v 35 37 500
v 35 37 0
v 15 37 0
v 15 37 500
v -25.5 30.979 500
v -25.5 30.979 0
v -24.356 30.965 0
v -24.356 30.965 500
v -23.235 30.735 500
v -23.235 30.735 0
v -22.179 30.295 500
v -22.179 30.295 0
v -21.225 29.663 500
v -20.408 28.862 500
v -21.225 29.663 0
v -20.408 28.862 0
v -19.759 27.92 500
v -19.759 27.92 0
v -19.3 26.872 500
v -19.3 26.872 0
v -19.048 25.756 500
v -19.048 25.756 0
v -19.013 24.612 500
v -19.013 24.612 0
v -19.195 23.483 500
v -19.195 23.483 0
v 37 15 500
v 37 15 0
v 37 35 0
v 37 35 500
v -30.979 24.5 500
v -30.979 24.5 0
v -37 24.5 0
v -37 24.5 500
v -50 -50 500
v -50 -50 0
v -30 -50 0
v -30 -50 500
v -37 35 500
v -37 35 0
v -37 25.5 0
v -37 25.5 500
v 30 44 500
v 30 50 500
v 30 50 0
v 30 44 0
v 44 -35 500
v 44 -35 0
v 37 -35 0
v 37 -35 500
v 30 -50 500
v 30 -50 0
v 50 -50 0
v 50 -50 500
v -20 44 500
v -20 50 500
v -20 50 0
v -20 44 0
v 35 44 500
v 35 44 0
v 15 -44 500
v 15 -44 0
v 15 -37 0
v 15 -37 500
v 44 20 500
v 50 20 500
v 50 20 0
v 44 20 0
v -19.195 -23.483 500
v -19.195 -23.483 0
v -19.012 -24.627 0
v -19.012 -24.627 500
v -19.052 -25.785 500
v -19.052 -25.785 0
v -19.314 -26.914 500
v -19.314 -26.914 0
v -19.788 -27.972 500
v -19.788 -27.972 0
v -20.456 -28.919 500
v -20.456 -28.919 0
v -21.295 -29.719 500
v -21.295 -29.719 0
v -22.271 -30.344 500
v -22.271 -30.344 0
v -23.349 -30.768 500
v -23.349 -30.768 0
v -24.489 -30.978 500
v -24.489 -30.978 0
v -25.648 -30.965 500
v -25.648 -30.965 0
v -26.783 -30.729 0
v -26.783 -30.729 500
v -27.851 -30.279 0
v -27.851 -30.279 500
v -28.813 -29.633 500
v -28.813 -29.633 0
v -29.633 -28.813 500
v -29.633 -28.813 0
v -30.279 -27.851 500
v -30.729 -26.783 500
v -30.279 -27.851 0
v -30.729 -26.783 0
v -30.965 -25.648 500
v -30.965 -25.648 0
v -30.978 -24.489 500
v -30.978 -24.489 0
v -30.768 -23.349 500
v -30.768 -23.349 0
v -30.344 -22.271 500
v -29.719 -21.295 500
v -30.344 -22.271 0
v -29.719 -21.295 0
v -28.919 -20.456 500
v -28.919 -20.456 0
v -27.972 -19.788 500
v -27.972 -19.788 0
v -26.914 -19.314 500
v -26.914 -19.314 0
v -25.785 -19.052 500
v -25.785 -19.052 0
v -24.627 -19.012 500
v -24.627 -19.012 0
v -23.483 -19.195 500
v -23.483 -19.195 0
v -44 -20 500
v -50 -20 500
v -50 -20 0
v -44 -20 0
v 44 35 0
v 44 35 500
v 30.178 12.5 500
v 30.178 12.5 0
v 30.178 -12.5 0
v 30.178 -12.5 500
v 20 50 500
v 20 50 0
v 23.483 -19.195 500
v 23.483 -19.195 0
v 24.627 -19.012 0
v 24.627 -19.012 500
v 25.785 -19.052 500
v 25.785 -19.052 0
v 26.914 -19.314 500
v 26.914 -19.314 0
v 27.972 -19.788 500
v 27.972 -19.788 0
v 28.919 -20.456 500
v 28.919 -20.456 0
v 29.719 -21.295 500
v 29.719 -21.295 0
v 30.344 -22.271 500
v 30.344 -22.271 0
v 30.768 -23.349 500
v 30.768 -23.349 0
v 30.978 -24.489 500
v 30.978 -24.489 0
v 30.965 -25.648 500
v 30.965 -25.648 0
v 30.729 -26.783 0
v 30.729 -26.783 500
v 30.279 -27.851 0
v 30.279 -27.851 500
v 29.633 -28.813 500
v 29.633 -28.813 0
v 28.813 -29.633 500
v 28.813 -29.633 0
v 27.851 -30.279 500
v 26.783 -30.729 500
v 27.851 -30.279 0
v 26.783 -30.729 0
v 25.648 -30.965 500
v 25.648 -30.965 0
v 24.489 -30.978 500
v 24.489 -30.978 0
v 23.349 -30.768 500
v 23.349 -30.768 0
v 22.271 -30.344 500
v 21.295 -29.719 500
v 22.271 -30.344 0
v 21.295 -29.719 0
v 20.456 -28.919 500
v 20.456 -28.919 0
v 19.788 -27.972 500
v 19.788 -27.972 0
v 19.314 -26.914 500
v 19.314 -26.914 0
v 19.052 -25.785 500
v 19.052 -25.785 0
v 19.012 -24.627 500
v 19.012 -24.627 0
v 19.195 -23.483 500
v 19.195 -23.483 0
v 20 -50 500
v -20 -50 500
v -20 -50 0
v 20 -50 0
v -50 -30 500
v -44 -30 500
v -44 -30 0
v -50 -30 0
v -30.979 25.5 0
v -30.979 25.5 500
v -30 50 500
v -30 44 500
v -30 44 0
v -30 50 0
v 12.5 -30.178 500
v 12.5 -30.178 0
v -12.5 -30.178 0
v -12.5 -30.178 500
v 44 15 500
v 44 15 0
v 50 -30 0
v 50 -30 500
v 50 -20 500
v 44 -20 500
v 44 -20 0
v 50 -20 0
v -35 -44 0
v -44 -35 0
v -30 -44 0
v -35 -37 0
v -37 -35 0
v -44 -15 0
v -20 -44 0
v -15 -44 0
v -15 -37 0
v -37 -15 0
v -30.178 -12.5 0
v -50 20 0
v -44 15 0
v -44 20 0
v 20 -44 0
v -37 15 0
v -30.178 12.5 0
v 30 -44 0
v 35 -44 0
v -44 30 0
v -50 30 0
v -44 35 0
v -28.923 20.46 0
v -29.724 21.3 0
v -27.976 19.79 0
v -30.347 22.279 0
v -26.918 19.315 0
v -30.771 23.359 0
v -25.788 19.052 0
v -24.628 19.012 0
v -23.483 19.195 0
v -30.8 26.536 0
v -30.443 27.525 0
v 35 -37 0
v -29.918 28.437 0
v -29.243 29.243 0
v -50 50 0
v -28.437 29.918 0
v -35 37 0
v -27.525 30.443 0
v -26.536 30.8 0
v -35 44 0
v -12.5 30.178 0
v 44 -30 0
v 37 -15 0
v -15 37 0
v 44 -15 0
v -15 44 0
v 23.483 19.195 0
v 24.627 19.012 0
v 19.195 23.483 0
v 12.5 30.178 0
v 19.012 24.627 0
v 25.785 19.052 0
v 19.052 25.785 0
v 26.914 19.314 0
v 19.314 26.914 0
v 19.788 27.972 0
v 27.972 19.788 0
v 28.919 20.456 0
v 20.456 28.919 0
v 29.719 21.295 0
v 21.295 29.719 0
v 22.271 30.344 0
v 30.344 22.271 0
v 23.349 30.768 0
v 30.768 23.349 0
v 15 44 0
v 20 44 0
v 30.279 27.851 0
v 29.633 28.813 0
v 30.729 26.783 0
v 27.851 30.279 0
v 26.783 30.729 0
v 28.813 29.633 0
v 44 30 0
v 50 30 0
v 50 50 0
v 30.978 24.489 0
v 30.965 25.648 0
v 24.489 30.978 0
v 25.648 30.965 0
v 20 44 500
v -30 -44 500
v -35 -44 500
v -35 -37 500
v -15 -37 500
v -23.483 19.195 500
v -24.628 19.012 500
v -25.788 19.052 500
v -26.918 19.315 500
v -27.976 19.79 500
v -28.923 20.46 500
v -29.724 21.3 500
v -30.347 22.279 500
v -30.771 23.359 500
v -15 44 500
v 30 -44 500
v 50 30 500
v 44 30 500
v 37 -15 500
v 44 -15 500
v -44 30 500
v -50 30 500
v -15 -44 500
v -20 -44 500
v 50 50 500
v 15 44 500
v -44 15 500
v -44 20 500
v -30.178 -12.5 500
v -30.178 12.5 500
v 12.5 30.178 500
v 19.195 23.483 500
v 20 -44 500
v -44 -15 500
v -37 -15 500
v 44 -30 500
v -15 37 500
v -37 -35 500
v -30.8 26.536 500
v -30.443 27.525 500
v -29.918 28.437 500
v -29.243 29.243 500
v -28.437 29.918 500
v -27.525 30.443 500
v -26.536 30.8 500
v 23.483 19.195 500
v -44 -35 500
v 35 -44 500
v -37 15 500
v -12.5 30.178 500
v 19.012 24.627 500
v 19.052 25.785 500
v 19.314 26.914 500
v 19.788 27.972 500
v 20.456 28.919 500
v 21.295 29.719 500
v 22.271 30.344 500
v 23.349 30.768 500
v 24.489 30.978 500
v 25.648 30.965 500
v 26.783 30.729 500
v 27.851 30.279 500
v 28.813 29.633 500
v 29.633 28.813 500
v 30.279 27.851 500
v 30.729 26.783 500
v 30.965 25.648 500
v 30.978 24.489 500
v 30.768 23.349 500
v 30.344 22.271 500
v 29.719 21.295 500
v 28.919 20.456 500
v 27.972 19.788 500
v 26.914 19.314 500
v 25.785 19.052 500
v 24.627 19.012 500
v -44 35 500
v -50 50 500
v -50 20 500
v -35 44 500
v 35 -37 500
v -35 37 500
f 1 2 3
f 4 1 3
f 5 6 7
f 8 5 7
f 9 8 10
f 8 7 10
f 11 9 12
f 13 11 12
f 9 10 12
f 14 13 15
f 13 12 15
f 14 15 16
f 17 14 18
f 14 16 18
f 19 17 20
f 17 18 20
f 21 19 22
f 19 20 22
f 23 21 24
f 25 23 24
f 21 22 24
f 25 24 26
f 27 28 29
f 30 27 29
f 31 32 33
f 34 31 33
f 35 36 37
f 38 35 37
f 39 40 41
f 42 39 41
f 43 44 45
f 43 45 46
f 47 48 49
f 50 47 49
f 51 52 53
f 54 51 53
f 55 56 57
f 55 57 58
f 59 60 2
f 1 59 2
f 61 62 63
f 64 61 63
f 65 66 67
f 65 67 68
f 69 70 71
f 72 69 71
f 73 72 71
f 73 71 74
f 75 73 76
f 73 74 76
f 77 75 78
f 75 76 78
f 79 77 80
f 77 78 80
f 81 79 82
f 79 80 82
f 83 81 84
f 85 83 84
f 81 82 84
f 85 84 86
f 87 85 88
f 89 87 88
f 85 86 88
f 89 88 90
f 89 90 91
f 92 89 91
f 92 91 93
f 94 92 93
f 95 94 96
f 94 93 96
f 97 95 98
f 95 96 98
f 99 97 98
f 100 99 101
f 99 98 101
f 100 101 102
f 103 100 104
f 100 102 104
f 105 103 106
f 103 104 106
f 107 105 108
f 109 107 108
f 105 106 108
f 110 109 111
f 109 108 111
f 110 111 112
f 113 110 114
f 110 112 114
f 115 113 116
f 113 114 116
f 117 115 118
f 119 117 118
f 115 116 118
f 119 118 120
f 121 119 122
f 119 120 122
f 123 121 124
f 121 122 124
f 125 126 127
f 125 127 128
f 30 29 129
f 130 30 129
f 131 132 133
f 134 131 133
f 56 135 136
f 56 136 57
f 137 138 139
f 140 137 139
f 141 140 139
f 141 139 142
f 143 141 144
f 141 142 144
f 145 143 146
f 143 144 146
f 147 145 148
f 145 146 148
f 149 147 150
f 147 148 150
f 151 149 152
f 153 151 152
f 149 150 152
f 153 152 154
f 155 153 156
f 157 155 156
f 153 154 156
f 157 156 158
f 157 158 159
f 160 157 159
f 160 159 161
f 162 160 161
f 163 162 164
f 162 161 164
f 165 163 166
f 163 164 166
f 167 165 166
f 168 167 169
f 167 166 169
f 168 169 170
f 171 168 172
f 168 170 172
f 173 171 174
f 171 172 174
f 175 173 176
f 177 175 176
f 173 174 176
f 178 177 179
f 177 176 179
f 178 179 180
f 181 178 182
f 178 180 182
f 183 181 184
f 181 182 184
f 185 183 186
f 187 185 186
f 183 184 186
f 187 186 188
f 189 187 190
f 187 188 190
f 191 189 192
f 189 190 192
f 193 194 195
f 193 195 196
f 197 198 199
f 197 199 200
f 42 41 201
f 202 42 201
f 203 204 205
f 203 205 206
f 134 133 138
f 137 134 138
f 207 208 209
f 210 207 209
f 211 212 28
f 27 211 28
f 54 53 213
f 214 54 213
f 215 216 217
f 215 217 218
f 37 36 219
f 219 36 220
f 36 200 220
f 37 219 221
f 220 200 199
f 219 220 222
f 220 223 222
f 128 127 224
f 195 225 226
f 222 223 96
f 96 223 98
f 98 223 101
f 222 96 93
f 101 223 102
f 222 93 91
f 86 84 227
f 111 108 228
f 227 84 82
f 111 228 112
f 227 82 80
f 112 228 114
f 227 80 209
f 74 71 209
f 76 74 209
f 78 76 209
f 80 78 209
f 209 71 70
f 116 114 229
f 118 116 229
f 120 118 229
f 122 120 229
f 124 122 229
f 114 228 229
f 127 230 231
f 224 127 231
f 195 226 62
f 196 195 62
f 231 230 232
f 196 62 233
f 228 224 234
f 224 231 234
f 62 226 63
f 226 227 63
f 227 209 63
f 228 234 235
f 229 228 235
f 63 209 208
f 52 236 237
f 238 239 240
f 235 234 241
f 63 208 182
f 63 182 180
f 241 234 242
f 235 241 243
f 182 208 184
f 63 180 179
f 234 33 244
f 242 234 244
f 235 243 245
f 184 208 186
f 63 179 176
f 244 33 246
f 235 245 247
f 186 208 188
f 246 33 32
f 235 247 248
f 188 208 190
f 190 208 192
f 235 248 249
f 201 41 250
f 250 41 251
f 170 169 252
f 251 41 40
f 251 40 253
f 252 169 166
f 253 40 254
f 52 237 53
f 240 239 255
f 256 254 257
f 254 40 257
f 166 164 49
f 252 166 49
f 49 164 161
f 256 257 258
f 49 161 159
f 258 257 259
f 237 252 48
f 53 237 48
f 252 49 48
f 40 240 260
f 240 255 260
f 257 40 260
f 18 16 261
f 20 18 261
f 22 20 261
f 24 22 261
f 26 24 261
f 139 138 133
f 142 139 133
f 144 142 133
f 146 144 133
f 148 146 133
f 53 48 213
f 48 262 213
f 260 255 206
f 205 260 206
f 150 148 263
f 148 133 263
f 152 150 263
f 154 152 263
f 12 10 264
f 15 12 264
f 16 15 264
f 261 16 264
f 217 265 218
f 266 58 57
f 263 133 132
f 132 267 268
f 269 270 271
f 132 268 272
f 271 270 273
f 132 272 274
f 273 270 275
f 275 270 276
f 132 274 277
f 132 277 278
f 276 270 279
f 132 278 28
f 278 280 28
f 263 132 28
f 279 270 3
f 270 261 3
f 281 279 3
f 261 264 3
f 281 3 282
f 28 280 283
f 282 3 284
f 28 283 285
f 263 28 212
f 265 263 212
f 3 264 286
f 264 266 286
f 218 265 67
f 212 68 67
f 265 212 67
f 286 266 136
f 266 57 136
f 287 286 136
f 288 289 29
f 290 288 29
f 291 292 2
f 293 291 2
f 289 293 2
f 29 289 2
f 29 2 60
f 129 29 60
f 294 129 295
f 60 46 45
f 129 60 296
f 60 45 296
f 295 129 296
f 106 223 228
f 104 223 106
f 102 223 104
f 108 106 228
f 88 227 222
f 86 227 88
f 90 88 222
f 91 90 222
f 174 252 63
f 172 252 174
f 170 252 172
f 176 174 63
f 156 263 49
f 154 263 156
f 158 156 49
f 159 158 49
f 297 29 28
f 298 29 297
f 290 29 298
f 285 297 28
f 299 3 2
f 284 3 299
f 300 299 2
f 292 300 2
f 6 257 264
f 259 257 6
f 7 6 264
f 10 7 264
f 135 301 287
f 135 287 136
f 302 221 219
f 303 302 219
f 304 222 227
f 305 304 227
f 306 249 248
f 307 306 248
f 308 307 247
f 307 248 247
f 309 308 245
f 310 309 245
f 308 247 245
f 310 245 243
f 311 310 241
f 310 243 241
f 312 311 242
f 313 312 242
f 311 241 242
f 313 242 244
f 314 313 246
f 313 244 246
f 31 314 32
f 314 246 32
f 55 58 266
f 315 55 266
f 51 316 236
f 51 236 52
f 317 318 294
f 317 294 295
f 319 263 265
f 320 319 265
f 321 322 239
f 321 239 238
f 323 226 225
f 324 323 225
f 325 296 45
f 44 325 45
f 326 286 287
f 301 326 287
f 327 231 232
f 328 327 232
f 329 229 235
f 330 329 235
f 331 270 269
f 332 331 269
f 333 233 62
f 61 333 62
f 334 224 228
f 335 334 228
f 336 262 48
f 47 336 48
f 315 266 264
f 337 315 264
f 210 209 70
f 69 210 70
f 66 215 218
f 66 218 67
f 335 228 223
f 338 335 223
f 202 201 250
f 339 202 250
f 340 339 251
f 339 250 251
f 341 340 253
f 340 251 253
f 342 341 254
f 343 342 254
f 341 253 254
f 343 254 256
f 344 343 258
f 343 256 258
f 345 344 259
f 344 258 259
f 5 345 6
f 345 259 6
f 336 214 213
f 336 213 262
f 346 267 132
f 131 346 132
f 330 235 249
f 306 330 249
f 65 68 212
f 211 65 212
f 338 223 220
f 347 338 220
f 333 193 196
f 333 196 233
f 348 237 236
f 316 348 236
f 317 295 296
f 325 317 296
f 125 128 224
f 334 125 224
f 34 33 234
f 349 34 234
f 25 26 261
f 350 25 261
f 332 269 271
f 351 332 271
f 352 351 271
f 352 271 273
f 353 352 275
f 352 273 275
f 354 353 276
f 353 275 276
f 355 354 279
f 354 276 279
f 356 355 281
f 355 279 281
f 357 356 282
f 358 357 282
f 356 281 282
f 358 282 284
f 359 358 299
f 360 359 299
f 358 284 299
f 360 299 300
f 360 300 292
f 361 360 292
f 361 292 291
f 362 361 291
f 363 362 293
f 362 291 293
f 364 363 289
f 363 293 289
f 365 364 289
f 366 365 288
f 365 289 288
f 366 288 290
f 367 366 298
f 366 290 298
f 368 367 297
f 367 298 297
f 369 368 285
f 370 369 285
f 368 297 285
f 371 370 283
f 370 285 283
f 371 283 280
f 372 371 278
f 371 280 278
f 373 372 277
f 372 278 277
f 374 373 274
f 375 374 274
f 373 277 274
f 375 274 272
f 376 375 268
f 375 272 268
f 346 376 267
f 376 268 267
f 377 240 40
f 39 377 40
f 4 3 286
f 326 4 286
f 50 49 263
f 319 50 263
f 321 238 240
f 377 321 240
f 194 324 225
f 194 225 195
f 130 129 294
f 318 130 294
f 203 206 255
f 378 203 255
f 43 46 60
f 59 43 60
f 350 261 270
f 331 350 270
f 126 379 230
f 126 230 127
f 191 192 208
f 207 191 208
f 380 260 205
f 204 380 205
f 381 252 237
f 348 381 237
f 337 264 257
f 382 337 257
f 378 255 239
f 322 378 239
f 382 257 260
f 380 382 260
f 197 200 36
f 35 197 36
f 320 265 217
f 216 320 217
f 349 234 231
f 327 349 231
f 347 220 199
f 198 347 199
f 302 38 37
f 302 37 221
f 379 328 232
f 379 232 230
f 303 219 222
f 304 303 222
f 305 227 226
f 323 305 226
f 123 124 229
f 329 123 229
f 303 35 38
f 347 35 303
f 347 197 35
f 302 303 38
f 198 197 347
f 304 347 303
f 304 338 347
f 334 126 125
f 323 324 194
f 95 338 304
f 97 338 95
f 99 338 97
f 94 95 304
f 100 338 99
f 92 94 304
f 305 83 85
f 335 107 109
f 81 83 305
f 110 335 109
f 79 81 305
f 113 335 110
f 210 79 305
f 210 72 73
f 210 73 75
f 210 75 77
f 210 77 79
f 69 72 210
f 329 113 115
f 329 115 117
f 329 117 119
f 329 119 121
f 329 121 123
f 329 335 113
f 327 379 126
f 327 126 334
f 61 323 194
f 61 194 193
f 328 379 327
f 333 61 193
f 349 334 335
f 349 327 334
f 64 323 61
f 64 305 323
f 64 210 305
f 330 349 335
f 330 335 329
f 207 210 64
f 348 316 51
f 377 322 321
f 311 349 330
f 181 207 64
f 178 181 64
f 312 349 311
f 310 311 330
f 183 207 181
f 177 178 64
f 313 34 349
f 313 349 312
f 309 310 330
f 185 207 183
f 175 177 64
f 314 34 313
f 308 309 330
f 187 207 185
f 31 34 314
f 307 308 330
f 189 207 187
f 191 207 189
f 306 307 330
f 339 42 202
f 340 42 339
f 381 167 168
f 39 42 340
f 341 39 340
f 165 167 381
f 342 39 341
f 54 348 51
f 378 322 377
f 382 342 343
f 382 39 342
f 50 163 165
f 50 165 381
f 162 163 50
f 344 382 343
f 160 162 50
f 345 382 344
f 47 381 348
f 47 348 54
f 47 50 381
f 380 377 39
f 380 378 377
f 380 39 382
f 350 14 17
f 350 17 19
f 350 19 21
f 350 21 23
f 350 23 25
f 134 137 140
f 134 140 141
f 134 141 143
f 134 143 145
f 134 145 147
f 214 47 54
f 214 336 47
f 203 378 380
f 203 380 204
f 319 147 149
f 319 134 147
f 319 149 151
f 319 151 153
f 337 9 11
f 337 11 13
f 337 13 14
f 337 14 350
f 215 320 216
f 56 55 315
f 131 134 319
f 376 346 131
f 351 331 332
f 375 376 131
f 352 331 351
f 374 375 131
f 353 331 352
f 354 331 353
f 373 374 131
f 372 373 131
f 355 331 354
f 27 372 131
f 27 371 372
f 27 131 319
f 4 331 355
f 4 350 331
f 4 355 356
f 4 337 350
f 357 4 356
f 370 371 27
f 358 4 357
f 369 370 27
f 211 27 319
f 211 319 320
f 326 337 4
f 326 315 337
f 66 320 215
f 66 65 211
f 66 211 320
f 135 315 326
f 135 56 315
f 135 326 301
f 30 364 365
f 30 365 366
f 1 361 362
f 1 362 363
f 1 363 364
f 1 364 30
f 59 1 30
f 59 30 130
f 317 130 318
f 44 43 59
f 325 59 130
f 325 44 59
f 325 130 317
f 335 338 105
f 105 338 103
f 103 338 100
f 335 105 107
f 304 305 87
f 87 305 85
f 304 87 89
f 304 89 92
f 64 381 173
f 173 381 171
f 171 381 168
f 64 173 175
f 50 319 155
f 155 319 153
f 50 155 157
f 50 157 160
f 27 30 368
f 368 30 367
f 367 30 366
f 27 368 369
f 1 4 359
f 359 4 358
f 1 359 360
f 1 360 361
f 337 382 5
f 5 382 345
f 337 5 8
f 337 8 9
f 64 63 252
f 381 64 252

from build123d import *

# Parameters (mm, degrees)
F1_DEPTH = 500


with BuildPart() as f1:
    # F0 (on Top) → F1 (new body)
    with BuildSketch(Plane.XY):
        with BuildLine():
            Line((-30, 50), (-50, 50))
            Line((-50, 50), (-50, 30))
            Line((-50, 30), (-44, 30))
            Line((-44, 30), (-44, 35))
            Line((-44, 35), (-37, 35))
            Line((-37, 35), (-37, 25.5))
            Line((-37, 25.5), (-30.97913, 25.5))
            ThreePointArc((-30.97913, 25.5), (-29.242641, 29.242641), (-25.5, 30.97913))
            ThreePointArc((-25.5, 30.97913), (-20.408156, 28.861991), (-19.195037, 23.482633))
            Line((-19.195037, 23.482633), (-12.5, 30.17767))
            Line((-12.5, 30.17767), (12.5, 30.17767))
            Line((12.5, 30.17767), (19.195037, 23.482633))
            ThreePointArc((19.195037, 23.482633), (29.242641, 29.242641), (23.482633, 19.195037))
            Line((23.482633, 19.195037), (30.17767, 12.5))
            Line((30.17767, 12.5), (30.17767, -12.5))
            Line((30.17767, -12.5), (23.482633, -19.195037))
            ThreePointArc((23.482633, -19.195037), (29.242641, -29.242641), (19.195037, -23.482633))
            Line((19.195037, -23.482633), (12.5, -30.17767))
            Line((12.5, -30.17767), (-12.5, -30.17767))
            Line((-12.5, -30.17767), (-19.195037, -23.482633))
            ThreePointArc((-19.195037, -23.482633), (-29.242641, -29.242641), (-23.482633, -19.195037))
            Line((-23.482633, -19.195037), (-30.17767, -12.5))
            Line((-30.17767, -12.5), (-30.17767, 12.5))
            Line((-30.17767, 12.5), (-23.482633, 19.195037))
            ThreePointArc((-23.482633, 19.195037), (-28.465904, 20.102295), (-30.97913, 24.5))
            Line((-30.97913, 24.5), (-37, 24.5))
            Line((-37, 24.5), (-37, 15))
            Line((-37, 15), (-44, 15))
            Line((-44, 15), (-44, 20))
            Line((-44, 20), (-50, 20))
            Line((-50, 20), (-50, -20))
            Line((-50, -20), (-44, -20))
            Line((-44, -20), (-44, -15))
            Line((-44, -15), (-37, -15))
            Line((-37, -15), (-37, -35))
            Line((-37, -35), (-44, -35))
            Line((-44, -35), (-44, -30))
            Line((-44, -30), (-50, -30))
            Line((-50, -30), (-50, -50))
            Line((-50, -50), (-30, -50))
            Line((-30, -50), (-30, -44))
            Line((-30, -44), (-35, -44))
            Line((-35, -44), (-35, -37))
            Line((-35, -37), (-15, -37))
            Line((-15, -37), (-15, -44))
            Line((-15, -44), (-20, -44))
            Line((-20, -44), (-20, -50))
            Line((-20, -50), (20, -50))
            Line((20, -50), (20, -44))
            Line((20, -44), (15, -44))
            Line((15, -44), (15, -37))
            Line((15, -37), (35, -37))
            Line((35, -37), (35, -44))
            Line((35, -44), (30, -44))
            Line((30, -44), (30, -50))
            Line((30, -50), (50, -50))
            Line((50, -50), (50, -30))
            Line((50, -30), (44, -30))
            Line((44, -30), (44, -35))
            Line((44, -35), (37, -35))
            Line((37, -35), (37, -15))
            Line((37, -15), (44, -15))
            Line((44, -15), (44, -20))
            Line((44, -20), (50, -20))
            Line((50, -20), (50, 20))
            Line((50, 20), (44, 20))
            Line((44, 20), (44, 15))
            Line((44, 15), (37, 15))
            Line((37, 15), (37, 35))
            Line((37, 35), (44, 35))
            Line((44, 35), (44, 30))
            Line((44, 30), (50, 30))
            Line((50, 30), (50, 50))
            Line((50, 50), (30, 50))
            Line((30, 50), (30, 44))
            Line((30, 44), (35, 44))
            Line((35, 44), (35, 37))
            Line((35, 37), (15, 37))
            Line((15, 37), (15, 44))
            Line((15, 44), (20, 44))
            Line((20, 44), (20, 50))
            Line((20, 50), (-20, 50))
            Line((-20, 50), (-20, 44))
            Line((-20, 44), (-15, 44))
            Line((-15, 44), (-15, 37))
            Line((-15, 37), (-25.5, 37))
            Line((-25.5, 37), (-35, 37))
            Line((-35, 37), (-35, 44))
            Line((-35, 44), (-30, 44))
            Line((-30, 44), (-30, 50))
        make_face()
    extrude(amount=F1_DEPTH)


solid = f1.part
